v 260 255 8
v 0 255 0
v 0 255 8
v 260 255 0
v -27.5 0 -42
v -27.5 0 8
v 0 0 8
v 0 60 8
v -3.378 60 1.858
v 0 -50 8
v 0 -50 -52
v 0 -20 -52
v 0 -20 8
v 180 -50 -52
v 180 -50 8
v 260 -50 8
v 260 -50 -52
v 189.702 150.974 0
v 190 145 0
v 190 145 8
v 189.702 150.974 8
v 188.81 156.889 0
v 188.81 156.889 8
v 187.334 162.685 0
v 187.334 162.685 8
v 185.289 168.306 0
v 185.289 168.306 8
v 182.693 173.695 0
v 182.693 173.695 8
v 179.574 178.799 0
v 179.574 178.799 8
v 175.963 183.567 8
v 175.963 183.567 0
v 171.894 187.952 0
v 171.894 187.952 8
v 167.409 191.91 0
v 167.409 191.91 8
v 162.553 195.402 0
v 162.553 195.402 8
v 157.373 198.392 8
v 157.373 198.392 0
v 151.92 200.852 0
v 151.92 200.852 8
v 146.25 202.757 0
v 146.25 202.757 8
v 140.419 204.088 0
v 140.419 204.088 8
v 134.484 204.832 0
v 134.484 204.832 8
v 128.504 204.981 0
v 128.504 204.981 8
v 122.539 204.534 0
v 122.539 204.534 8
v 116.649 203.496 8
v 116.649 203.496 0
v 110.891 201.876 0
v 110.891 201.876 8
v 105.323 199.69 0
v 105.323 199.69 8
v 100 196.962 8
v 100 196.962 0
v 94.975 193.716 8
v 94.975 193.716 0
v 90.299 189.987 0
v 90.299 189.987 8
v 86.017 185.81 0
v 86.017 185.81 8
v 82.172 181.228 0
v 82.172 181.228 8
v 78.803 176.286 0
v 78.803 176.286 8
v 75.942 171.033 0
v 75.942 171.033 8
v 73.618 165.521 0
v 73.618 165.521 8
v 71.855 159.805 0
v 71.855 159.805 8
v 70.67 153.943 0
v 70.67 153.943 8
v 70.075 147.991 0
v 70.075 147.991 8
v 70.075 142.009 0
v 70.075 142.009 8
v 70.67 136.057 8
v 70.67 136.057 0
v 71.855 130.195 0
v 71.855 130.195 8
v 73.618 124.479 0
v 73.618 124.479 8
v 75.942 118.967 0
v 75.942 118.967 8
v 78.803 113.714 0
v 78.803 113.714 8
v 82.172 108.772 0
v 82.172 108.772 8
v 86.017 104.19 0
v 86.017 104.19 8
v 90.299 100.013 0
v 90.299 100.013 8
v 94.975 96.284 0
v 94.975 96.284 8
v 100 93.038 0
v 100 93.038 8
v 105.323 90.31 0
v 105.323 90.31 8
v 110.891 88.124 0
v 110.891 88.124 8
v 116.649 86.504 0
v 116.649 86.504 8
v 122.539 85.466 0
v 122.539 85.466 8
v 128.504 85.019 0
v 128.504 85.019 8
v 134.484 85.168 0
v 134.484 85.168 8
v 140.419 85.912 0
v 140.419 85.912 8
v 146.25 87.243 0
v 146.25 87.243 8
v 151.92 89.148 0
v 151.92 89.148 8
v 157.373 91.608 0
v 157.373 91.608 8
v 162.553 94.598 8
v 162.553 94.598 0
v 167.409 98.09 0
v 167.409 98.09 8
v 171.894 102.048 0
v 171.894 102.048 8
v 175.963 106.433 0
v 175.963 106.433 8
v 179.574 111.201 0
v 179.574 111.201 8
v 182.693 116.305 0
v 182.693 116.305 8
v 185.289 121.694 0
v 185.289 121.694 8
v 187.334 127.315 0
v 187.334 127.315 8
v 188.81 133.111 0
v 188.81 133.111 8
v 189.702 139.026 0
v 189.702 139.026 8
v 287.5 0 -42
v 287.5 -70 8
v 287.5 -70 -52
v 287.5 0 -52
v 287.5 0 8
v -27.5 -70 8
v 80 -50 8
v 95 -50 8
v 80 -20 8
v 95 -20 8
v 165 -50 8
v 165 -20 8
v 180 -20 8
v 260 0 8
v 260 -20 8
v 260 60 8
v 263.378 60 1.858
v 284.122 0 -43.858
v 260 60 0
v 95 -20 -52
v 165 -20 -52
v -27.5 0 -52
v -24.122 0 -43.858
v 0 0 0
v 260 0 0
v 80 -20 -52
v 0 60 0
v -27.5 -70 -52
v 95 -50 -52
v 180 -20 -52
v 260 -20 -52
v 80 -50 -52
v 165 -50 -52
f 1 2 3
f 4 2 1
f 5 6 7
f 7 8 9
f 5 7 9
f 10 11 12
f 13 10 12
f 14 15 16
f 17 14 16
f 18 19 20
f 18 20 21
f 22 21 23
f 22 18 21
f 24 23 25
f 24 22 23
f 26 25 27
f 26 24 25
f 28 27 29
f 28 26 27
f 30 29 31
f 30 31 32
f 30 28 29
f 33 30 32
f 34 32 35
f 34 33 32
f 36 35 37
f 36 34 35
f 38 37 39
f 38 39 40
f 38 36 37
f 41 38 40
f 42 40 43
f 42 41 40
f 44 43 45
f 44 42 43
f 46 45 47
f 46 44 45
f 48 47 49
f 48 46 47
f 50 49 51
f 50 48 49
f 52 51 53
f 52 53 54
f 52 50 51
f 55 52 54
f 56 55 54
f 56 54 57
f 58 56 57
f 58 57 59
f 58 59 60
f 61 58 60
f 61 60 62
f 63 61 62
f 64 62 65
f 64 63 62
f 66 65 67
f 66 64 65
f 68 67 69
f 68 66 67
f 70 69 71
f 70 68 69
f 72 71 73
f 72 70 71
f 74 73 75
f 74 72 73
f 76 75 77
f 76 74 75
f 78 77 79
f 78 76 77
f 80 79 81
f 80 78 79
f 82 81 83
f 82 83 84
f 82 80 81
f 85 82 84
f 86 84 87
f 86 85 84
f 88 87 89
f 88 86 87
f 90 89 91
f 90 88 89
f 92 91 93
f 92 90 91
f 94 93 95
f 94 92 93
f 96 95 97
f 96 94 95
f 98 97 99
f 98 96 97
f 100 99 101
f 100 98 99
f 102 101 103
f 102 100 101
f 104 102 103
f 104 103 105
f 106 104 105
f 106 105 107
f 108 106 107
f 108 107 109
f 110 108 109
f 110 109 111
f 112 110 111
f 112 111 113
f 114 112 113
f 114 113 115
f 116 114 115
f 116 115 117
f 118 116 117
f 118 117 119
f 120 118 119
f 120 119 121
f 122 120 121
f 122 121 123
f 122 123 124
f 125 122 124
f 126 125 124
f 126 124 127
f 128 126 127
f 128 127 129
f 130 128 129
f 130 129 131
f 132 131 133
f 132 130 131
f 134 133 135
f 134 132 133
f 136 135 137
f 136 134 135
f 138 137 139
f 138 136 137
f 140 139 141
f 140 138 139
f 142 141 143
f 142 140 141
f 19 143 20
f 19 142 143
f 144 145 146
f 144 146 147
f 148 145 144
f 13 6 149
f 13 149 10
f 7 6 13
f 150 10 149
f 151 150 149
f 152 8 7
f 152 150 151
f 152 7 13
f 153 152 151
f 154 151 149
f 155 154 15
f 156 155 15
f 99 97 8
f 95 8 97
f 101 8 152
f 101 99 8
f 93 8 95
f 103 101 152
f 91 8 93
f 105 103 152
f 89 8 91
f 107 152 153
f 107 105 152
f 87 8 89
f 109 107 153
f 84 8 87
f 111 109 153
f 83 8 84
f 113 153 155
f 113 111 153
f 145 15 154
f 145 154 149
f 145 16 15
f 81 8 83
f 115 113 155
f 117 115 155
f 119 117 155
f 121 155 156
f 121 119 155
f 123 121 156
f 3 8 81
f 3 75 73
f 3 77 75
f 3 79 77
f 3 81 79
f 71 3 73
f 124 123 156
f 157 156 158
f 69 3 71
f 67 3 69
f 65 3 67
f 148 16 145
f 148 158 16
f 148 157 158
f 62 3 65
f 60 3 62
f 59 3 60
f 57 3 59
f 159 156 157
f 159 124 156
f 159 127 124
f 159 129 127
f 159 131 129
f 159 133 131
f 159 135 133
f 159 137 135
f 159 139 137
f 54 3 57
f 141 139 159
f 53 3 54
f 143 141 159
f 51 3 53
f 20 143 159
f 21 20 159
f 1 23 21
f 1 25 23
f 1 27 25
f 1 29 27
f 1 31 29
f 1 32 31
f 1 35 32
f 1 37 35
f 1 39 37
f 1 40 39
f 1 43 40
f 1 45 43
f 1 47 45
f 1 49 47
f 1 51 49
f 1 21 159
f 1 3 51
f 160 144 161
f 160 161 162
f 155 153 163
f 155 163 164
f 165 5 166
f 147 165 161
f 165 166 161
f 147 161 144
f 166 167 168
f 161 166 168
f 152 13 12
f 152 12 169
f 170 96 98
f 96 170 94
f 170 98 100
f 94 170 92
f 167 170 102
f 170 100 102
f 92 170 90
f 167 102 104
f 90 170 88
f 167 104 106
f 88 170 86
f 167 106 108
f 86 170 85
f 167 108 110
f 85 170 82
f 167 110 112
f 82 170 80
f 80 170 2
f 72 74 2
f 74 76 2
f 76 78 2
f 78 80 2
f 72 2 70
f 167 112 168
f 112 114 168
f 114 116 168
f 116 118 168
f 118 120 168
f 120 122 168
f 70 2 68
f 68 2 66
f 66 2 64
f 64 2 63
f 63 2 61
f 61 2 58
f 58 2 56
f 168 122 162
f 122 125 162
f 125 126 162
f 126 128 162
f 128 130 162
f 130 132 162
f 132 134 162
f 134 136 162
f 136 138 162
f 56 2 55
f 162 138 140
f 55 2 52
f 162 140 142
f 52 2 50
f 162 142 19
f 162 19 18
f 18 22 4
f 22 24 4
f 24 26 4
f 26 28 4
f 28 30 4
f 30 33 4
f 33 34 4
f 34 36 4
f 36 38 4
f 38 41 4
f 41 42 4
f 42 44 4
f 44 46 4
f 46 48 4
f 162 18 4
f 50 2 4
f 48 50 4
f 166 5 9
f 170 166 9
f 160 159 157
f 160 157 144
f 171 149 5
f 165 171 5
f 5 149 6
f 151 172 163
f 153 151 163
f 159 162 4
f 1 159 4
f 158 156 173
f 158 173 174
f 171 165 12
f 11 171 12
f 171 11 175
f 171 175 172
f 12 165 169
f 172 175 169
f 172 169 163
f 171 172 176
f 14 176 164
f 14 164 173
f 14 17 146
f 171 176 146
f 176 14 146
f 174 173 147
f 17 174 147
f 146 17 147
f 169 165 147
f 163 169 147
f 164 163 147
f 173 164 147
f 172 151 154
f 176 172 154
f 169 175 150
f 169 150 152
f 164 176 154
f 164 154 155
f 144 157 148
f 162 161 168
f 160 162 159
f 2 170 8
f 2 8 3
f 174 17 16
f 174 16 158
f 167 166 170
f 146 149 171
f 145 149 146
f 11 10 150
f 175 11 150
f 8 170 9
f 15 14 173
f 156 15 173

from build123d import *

# Parameters (mm, degrees)
SKETCH1_W           = 260
SKETCH1_H           = 255
SKETCH1_R           = 60
BOSS_EXTRUDE1_DEPTH = 8
SKETCH2_W           = 315
SKETCH2_H           = 70
SKETCH2_W_2         = 80
SKETCH2_H_2         = 30
SKETCH2_W_3         = 70
BOSS_EXTRUDE2_DEPTH = 60
BOSS_EXTRUDE3_DEPTH = 60
CUT_EXTRUDE1_REACH  = 282.827
CUT_EXTRUDE2_REACH  = 282.827


with BuildPart() as part:
    # Sketch1 → Boss-Extrude1 (new body)
    with BuildSketch(Plane.XY):
        with Locations((130, 127.5)):
            Rectangle(SKETCH1_W, SKETCH1_H)
        with Locations((130, 145)):
            Circle(SKETCH1_R, mode=Mode.SUBTRACT)
    extrude(amount=BOSS_EXTRUDE1_DEPTH)

    # Sketch2 → Boss-Extrude2 (add)
    with BuildSketch(Plane.XY.offset(8)):
        with Locations((130, -35)):
            Rectangle(SKETCH2_W, SKETCH2_H)
        with Locations((40, -35)):
            Rectangle(SKETCH2_W_2, SKETCH2_H_2, mode=Mode.SUBTRACT)
        with Locations((220, -35)):
            Rectangle(SKETCH2_W_2, SKETCH2_H_2, mode=Mode.SUBTRACT)
        with Locations((130, -35)):
            Rectangle(SKETCH2_W_3, SKETCH2_H_2, mode=Mode.SUBTRACT)
    extrude(amount=-BOSS_EXTRUDE2_DEPTH)

    # Sketch3 → Boss-Extrude3 (add)
    with BuildSketch(Plane(origin=(0, 0, 0), x_dir=(1, 0, 0), z_dir=(0, 1, 0))):
        Polygon((260, -8), (287.5, 42), (284.121880998, 43.857965451), (260, 0), align=None)
        Polygon((0, -8), (-27.5, 42), (-24.121880998, 43.857965451), (0, 0), align=None)
    extrude(amount=BOSS_EXTRUDE3_DEPTH)

    # Sketch4 → Cut-Extrude1 (cut, up to next)
    with BuildSketch(Plane(origin=(202.994241843, 0, 111.646833013), x_dir=(0.48191875, 0, -0.876215909), z_dir=(0.876215909, 0, 0.48191875)), mode=Mode.PRIVATE) as cut_extrude1_sk1:
        Polygon((175.352708724, 0), (125.298874941, 60), (175.352708724, 60), align=None)
    cut_extrude1_tool1 = extrude(cut_extrude1_sk1.sketch, amount=-CUT_EXTRUDE1_REACH, mode=Mode.PRIVATE) & part.part
    add(cut_extrude1_tool1.solids().sort_by_distance((279.459373, 40, -27.380678))[0], mode=Mode.SUBTRACT)

    # Sketch5 → Cut-Extrude2 (cut, up to next)
    with BuildSketch(Plane(origin=(-3.378119002, 0, 1.857965451), x_dir=(0.48191875, 0, 0.876215909), z_dir=(-0.876215909, 0, 0.48191875)), mode=Mode.PRIVATE) as cut_extrude2_sk1:
        Polygon((-50.053833783, 0), (0, 60), (-50.053833783, 60), align=None)
    cut_extrude2_tool1 = extrude(cut_extrude2_sk1.sketch, amount=-CUT_EXTRUDE2_REACH, mode=Mode.PRIVATE) & part.part
    add(cut_extrude2_tool1.solids().sort_by_distance((-19.459373, 40, -27.380678))[0], mode=Mode.SUBTRACT)


solid = part.part
